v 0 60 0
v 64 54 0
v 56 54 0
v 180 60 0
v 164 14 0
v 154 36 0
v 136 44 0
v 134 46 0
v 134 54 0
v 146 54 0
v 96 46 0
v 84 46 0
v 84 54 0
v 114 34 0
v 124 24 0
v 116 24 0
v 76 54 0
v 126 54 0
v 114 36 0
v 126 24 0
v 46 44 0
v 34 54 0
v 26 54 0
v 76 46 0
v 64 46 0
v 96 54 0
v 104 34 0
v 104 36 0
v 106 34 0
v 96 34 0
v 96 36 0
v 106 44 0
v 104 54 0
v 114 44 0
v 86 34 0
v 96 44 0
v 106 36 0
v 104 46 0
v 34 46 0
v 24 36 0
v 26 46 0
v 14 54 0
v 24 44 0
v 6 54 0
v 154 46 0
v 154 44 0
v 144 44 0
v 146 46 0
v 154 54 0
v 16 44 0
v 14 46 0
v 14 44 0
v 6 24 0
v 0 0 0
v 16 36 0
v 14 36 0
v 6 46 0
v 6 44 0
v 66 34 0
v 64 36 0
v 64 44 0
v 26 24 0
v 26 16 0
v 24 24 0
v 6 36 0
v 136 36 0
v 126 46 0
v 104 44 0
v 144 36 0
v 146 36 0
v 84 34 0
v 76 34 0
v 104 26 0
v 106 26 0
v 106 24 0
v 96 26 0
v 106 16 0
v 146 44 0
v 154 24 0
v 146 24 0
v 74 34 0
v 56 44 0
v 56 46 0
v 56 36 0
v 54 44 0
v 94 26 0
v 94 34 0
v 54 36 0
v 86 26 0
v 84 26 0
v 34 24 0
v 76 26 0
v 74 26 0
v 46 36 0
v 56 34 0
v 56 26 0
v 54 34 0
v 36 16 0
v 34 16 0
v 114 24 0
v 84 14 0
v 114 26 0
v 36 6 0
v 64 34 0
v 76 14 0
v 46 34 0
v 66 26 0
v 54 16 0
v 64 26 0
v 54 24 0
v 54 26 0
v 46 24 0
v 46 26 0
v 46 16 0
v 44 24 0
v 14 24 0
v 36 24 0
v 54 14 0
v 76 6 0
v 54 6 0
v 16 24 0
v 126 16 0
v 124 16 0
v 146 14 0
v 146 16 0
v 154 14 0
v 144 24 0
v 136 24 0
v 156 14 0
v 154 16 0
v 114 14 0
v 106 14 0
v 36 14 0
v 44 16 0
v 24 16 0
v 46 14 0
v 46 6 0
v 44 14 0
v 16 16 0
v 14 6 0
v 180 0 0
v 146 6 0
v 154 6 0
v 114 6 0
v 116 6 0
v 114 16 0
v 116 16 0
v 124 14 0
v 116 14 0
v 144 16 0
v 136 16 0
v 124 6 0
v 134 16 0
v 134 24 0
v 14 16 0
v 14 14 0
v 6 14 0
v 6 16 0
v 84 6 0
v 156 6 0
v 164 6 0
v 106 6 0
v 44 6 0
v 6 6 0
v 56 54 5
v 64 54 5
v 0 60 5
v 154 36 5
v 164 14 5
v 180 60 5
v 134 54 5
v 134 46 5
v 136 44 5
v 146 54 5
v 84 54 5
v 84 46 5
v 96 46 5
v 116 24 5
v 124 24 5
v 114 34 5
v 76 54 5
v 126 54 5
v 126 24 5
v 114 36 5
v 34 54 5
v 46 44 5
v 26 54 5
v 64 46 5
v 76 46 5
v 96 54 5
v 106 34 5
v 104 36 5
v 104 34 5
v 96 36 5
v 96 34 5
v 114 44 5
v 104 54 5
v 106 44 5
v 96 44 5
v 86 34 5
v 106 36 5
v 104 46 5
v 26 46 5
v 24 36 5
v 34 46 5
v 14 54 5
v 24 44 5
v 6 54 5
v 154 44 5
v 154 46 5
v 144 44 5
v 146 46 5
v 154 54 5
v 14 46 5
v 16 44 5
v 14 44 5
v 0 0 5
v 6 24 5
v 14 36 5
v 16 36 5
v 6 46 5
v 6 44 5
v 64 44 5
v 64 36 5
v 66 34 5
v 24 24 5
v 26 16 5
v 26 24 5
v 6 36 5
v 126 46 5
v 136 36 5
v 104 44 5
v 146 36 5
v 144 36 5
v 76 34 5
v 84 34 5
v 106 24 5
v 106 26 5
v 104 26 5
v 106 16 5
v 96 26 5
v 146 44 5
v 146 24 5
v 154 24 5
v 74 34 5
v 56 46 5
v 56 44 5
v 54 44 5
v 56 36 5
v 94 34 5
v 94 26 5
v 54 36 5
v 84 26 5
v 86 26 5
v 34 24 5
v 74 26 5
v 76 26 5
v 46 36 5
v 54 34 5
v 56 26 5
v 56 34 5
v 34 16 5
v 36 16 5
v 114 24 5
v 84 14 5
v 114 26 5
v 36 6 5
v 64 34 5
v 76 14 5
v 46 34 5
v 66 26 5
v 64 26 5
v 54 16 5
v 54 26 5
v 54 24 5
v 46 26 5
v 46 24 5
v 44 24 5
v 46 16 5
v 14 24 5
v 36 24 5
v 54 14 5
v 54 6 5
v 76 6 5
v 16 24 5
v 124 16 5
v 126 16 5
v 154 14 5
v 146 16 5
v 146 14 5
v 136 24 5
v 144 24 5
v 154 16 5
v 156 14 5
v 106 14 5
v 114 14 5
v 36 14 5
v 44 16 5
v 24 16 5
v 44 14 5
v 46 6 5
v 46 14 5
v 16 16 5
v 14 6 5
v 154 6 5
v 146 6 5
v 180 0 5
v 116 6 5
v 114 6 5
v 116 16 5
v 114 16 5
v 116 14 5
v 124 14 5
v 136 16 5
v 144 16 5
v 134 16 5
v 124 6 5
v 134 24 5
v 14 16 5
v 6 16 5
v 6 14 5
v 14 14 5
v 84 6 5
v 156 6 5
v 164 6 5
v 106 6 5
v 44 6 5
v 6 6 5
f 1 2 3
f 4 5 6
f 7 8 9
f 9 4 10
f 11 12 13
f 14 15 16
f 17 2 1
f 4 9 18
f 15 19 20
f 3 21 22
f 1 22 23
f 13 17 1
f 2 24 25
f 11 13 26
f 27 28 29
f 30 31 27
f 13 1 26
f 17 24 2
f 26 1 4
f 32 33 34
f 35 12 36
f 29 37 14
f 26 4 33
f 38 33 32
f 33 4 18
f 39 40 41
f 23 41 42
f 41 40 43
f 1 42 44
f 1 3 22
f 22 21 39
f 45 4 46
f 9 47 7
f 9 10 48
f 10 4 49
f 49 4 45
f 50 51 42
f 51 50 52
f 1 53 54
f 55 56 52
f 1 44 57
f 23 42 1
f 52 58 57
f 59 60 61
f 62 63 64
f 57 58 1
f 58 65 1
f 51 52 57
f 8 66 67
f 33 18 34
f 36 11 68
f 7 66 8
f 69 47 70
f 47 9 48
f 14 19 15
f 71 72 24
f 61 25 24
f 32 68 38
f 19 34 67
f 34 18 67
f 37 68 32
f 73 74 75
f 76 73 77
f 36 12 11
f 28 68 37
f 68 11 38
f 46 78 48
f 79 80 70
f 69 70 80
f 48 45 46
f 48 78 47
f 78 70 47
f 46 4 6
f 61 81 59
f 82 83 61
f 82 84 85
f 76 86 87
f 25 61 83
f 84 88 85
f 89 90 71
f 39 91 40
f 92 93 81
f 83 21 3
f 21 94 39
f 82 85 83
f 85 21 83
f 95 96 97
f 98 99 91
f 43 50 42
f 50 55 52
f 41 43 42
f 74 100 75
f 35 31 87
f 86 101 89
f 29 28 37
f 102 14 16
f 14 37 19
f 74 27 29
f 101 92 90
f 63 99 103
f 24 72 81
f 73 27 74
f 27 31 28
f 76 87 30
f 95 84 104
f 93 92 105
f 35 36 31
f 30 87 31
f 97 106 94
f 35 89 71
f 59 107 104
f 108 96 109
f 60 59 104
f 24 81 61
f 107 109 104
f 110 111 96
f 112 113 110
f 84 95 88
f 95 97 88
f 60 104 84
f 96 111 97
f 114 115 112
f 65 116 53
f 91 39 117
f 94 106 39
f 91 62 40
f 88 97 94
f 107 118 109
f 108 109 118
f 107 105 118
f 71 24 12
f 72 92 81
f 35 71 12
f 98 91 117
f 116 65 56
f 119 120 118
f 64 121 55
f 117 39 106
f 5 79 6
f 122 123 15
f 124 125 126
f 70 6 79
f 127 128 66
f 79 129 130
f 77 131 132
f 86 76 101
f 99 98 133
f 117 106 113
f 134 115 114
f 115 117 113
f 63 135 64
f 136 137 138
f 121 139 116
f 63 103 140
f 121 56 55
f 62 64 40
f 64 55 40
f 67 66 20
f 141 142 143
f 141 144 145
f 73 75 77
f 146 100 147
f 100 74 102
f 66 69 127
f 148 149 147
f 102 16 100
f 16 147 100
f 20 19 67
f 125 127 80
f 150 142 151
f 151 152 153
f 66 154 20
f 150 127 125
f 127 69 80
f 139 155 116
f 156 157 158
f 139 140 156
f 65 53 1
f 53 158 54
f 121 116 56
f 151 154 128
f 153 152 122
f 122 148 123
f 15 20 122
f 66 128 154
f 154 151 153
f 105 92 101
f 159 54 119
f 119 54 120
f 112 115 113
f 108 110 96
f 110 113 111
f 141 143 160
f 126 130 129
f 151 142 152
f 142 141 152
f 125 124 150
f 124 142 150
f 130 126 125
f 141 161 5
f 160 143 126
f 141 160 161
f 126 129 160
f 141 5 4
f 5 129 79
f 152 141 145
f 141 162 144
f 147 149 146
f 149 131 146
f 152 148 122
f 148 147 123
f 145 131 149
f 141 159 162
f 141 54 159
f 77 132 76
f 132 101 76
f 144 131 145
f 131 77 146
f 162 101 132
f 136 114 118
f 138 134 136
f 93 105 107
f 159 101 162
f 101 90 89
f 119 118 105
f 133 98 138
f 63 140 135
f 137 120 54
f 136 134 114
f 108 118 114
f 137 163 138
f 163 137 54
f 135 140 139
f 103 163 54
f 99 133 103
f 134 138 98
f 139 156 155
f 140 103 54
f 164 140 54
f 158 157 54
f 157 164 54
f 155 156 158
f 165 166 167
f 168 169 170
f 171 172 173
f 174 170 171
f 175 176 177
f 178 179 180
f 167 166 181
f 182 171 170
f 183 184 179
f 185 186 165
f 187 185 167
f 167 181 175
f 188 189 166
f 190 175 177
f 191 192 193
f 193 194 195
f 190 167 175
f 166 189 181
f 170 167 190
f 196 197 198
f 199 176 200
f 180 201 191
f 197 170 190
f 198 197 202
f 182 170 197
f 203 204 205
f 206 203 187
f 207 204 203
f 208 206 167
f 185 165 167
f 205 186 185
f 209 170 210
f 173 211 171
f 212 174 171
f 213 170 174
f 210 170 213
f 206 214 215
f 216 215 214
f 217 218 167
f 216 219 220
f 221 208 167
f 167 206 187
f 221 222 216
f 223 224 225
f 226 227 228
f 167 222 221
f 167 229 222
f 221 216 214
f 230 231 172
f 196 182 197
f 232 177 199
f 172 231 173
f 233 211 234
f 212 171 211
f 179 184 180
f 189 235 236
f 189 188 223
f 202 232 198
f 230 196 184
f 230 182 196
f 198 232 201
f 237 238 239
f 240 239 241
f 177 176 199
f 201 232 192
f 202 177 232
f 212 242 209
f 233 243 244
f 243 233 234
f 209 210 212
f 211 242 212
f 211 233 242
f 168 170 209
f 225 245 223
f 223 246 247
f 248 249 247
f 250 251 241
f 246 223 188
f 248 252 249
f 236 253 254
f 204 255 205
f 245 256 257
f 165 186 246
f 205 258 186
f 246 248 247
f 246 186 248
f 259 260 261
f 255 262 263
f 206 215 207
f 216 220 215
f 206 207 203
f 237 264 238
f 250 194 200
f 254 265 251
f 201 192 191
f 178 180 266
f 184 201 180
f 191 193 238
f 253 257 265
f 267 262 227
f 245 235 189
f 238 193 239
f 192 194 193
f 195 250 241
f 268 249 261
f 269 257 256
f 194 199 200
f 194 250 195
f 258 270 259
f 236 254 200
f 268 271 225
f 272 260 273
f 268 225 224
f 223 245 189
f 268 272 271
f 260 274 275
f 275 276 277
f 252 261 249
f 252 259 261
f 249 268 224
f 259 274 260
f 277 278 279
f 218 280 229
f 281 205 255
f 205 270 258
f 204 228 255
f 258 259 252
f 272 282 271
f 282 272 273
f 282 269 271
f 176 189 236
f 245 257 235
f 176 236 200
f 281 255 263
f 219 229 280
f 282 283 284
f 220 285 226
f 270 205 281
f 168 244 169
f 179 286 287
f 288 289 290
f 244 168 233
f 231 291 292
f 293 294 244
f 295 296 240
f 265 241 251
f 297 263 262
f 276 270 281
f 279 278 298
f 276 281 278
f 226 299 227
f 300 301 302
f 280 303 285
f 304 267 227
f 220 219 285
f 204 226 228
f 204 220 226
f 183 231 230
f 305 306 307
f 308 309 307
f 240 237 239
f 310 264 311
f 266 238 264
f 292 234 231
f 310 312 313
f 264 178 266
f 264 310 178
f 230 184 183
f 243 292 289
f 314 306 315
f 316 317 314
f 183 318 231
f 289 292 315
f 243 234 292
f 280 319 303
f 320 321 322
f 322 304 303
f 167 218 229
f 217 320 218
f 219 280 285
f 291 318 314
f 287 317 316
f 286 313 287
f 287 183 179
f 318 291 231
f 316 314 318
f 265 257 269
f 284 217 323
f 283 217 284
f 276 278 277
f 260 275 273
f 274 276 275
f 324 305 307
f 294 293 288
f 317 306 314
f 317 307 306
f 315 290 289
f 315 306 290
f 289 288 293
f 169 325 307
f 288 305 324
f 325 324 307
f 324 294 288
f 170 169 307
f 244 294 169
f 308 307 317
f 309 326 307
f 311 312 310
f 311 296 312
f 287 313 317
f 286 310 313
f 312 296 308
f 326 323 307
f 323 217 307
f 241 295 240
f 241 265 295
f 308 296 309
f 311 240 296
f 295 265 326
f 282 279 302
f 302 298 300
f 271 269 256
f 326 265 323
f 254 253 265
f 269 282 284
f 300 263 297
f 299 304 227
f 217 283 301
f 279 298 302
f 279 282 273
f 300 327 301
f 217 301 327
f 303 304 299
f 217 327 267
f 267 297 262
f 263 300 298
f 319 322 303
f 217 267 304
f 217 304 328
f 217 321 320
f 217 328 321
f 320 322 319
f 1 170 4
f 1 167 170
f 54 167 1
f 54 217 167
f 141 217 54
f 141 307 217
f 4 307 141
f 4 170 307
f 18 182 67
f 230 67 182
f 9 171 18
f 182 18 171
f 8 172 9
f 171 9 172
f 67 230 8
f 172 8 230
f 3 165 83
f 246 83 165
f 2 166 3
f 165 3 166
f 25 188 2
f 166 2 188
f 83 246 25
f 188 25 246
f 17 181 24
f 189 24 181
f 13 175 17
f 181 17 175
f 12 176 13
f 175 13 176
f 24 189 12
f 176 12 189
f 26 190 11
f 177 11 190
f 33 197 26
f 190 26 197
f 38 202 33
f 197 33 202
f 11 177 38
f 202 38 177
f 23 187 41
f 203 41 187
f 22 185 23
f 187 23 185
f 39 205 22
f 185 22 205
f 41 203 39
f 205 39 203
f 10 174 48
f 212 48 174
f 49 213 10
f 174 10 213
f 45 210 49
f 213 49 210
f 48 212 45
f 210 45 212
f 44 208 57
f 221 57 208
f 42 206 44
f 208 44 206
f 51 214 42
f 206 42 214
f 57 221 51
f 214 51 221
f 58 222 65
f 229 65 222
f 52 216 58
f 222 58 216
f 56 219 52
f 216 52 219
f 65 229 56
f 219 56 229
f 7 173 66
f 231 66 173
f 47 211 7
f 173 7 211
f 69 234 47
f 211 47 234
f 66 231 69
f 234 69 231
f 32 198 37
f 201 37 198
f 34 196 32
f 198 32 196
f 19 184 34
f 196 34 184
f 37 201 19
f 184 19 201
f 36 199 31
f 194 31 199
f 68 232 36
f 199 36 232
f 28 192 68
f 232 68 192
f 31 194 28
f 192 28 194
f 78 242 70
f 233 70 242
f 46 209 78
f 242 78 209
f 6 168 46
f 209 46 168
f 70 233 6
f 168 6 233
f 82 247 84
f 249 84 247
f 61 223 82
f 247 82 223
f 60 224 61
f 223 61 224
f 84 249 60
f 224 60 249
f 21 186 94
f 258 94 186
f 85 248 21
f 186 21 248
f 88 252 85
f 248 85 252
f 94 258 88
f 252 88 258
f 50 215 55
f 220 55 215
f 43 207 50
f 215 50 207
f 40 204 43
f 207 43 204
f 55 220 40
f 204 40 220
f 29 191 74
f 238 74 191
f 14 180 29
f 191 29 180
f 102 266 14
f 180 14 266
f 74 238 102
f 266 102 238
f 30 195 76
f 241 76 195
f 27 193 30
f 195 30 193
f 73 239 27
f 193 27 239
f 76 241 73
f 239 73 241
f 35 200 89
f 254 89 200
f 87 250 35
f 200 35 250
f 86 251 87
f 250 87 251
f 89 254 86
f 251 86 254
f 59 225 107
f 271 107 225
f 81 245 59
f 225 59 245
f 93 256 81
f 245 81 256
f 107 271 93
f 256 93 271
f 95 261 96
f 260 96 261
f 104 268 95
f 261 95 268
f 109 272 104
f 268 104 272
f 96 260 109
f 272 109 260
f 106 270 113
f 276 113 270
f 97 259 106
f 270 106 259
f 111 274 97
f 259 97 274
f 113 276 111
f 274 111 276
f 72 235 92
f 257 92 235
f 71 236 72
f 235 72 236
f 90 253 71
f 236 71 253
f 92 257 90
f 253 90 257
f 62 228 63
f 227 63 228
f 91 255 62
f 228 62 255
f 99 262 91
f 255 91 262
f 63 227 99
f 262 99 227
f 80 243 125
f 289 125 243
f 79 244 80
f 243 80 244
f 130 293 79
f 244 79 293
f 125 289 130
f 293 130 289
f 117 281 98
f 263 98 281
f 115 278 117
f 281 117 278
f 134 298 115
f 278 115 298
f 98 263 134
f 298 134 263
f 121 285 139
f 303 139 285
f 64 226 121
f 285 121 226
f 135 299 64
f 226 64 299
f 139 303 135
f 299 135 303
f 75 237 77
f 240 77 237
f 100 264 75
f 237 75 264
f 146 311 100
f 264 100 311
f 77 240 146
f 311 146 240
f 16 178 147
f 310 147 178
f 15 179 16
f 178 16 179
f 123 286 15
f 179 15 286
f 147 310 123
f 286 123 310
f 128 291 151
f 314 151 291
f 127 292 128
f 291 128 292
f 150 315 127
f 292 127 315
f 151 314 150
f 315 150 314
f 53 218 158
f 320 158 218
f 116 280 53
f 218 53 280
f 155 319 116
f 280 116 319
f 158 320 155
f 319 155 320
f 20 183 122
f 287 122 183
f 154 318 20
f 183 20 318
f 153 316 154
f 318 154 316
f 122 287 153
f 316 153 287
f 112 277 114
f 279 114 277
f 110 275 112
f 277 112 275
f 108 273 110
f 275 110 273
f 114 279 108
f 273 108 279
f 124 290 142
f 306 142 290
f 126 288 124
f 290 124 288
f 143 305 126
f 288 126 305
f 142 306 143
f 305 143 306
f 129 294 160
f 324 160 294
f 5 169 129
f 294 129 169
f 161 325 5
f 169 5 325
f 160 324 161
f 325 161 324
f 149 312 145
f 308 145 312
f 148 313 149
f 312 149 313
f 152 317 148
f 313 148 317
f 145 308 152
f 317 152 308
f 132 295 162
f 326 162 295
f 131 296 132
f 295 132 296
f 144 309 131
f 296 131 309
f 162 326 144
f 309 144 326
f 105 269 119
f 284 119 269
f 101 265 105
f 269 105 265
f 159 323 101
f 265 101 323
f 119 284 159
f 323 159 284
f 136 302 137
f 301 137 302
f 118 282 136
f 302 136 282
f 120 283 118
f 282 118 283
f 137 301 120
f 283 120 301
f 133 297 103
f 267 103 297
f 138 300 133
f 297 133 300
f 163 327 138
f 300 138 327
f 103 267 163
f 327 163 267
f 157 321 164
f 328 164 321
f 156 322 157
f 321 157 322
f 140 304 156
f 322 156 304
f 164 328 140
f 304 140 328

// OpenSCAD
// Digital Camo Spray Paint Stencil - Squares
// 180 x 60 x 5 mm
// Grid of square cutouts in a pseudo-random pattern.
// Each cutout is smaller than its cell, leaving a thin web of material
// between every neighbor so the stencil stays in one piece.

// ===== Parameters =====
length    = 180;   // X
height    = 60;    // Y
thickness = 5;     // Z
cell      = 10;    // grid cell size
cutout    = 8;     // cutout square size within cell (cell - cutout = wall thickness)
frame_x   = 5;     // outer frame, sides
frame_y   = 5;     // outer frame, top and bottom
fill_pct  = 45;    // 0..100, percent of cells that get cut

// ===== Computed =====
inner_w = length - 2 * frame_x;
inner_h = height - 2 * frame_y;
cols    = floor(inner_w / cell);
rows    = floor(inner_h / cell);
// Center the grid in the available interior
grid_x  = (length - cols * cell) / 2;
grid_y  = (height - rows * cell) / 2;

// ===== Main =====
linear_extrude(height = thickness)
    difference() {
        square([length, height]);
        for (c = [0 : cols - 1])
            for (r = [0 : rows - 1])
                if (should_cut(c, r))
                    translate([
                        grid_x + c * cell + (cell - cutout) / 2,
                        grid_y + r * cell + (cell - cutout) / 2
                    ])
                        square([cutout, cutout]);
    }

// ===== Deterministic pseudo-random selector =====
// Same (c, r) always yields the same result. Tweak the constants to reshuffle.
function should_cut(c, r) =
    ((c * 73 + r * 31 + c * r * 17 + 11) % 100) < fill_pct;
